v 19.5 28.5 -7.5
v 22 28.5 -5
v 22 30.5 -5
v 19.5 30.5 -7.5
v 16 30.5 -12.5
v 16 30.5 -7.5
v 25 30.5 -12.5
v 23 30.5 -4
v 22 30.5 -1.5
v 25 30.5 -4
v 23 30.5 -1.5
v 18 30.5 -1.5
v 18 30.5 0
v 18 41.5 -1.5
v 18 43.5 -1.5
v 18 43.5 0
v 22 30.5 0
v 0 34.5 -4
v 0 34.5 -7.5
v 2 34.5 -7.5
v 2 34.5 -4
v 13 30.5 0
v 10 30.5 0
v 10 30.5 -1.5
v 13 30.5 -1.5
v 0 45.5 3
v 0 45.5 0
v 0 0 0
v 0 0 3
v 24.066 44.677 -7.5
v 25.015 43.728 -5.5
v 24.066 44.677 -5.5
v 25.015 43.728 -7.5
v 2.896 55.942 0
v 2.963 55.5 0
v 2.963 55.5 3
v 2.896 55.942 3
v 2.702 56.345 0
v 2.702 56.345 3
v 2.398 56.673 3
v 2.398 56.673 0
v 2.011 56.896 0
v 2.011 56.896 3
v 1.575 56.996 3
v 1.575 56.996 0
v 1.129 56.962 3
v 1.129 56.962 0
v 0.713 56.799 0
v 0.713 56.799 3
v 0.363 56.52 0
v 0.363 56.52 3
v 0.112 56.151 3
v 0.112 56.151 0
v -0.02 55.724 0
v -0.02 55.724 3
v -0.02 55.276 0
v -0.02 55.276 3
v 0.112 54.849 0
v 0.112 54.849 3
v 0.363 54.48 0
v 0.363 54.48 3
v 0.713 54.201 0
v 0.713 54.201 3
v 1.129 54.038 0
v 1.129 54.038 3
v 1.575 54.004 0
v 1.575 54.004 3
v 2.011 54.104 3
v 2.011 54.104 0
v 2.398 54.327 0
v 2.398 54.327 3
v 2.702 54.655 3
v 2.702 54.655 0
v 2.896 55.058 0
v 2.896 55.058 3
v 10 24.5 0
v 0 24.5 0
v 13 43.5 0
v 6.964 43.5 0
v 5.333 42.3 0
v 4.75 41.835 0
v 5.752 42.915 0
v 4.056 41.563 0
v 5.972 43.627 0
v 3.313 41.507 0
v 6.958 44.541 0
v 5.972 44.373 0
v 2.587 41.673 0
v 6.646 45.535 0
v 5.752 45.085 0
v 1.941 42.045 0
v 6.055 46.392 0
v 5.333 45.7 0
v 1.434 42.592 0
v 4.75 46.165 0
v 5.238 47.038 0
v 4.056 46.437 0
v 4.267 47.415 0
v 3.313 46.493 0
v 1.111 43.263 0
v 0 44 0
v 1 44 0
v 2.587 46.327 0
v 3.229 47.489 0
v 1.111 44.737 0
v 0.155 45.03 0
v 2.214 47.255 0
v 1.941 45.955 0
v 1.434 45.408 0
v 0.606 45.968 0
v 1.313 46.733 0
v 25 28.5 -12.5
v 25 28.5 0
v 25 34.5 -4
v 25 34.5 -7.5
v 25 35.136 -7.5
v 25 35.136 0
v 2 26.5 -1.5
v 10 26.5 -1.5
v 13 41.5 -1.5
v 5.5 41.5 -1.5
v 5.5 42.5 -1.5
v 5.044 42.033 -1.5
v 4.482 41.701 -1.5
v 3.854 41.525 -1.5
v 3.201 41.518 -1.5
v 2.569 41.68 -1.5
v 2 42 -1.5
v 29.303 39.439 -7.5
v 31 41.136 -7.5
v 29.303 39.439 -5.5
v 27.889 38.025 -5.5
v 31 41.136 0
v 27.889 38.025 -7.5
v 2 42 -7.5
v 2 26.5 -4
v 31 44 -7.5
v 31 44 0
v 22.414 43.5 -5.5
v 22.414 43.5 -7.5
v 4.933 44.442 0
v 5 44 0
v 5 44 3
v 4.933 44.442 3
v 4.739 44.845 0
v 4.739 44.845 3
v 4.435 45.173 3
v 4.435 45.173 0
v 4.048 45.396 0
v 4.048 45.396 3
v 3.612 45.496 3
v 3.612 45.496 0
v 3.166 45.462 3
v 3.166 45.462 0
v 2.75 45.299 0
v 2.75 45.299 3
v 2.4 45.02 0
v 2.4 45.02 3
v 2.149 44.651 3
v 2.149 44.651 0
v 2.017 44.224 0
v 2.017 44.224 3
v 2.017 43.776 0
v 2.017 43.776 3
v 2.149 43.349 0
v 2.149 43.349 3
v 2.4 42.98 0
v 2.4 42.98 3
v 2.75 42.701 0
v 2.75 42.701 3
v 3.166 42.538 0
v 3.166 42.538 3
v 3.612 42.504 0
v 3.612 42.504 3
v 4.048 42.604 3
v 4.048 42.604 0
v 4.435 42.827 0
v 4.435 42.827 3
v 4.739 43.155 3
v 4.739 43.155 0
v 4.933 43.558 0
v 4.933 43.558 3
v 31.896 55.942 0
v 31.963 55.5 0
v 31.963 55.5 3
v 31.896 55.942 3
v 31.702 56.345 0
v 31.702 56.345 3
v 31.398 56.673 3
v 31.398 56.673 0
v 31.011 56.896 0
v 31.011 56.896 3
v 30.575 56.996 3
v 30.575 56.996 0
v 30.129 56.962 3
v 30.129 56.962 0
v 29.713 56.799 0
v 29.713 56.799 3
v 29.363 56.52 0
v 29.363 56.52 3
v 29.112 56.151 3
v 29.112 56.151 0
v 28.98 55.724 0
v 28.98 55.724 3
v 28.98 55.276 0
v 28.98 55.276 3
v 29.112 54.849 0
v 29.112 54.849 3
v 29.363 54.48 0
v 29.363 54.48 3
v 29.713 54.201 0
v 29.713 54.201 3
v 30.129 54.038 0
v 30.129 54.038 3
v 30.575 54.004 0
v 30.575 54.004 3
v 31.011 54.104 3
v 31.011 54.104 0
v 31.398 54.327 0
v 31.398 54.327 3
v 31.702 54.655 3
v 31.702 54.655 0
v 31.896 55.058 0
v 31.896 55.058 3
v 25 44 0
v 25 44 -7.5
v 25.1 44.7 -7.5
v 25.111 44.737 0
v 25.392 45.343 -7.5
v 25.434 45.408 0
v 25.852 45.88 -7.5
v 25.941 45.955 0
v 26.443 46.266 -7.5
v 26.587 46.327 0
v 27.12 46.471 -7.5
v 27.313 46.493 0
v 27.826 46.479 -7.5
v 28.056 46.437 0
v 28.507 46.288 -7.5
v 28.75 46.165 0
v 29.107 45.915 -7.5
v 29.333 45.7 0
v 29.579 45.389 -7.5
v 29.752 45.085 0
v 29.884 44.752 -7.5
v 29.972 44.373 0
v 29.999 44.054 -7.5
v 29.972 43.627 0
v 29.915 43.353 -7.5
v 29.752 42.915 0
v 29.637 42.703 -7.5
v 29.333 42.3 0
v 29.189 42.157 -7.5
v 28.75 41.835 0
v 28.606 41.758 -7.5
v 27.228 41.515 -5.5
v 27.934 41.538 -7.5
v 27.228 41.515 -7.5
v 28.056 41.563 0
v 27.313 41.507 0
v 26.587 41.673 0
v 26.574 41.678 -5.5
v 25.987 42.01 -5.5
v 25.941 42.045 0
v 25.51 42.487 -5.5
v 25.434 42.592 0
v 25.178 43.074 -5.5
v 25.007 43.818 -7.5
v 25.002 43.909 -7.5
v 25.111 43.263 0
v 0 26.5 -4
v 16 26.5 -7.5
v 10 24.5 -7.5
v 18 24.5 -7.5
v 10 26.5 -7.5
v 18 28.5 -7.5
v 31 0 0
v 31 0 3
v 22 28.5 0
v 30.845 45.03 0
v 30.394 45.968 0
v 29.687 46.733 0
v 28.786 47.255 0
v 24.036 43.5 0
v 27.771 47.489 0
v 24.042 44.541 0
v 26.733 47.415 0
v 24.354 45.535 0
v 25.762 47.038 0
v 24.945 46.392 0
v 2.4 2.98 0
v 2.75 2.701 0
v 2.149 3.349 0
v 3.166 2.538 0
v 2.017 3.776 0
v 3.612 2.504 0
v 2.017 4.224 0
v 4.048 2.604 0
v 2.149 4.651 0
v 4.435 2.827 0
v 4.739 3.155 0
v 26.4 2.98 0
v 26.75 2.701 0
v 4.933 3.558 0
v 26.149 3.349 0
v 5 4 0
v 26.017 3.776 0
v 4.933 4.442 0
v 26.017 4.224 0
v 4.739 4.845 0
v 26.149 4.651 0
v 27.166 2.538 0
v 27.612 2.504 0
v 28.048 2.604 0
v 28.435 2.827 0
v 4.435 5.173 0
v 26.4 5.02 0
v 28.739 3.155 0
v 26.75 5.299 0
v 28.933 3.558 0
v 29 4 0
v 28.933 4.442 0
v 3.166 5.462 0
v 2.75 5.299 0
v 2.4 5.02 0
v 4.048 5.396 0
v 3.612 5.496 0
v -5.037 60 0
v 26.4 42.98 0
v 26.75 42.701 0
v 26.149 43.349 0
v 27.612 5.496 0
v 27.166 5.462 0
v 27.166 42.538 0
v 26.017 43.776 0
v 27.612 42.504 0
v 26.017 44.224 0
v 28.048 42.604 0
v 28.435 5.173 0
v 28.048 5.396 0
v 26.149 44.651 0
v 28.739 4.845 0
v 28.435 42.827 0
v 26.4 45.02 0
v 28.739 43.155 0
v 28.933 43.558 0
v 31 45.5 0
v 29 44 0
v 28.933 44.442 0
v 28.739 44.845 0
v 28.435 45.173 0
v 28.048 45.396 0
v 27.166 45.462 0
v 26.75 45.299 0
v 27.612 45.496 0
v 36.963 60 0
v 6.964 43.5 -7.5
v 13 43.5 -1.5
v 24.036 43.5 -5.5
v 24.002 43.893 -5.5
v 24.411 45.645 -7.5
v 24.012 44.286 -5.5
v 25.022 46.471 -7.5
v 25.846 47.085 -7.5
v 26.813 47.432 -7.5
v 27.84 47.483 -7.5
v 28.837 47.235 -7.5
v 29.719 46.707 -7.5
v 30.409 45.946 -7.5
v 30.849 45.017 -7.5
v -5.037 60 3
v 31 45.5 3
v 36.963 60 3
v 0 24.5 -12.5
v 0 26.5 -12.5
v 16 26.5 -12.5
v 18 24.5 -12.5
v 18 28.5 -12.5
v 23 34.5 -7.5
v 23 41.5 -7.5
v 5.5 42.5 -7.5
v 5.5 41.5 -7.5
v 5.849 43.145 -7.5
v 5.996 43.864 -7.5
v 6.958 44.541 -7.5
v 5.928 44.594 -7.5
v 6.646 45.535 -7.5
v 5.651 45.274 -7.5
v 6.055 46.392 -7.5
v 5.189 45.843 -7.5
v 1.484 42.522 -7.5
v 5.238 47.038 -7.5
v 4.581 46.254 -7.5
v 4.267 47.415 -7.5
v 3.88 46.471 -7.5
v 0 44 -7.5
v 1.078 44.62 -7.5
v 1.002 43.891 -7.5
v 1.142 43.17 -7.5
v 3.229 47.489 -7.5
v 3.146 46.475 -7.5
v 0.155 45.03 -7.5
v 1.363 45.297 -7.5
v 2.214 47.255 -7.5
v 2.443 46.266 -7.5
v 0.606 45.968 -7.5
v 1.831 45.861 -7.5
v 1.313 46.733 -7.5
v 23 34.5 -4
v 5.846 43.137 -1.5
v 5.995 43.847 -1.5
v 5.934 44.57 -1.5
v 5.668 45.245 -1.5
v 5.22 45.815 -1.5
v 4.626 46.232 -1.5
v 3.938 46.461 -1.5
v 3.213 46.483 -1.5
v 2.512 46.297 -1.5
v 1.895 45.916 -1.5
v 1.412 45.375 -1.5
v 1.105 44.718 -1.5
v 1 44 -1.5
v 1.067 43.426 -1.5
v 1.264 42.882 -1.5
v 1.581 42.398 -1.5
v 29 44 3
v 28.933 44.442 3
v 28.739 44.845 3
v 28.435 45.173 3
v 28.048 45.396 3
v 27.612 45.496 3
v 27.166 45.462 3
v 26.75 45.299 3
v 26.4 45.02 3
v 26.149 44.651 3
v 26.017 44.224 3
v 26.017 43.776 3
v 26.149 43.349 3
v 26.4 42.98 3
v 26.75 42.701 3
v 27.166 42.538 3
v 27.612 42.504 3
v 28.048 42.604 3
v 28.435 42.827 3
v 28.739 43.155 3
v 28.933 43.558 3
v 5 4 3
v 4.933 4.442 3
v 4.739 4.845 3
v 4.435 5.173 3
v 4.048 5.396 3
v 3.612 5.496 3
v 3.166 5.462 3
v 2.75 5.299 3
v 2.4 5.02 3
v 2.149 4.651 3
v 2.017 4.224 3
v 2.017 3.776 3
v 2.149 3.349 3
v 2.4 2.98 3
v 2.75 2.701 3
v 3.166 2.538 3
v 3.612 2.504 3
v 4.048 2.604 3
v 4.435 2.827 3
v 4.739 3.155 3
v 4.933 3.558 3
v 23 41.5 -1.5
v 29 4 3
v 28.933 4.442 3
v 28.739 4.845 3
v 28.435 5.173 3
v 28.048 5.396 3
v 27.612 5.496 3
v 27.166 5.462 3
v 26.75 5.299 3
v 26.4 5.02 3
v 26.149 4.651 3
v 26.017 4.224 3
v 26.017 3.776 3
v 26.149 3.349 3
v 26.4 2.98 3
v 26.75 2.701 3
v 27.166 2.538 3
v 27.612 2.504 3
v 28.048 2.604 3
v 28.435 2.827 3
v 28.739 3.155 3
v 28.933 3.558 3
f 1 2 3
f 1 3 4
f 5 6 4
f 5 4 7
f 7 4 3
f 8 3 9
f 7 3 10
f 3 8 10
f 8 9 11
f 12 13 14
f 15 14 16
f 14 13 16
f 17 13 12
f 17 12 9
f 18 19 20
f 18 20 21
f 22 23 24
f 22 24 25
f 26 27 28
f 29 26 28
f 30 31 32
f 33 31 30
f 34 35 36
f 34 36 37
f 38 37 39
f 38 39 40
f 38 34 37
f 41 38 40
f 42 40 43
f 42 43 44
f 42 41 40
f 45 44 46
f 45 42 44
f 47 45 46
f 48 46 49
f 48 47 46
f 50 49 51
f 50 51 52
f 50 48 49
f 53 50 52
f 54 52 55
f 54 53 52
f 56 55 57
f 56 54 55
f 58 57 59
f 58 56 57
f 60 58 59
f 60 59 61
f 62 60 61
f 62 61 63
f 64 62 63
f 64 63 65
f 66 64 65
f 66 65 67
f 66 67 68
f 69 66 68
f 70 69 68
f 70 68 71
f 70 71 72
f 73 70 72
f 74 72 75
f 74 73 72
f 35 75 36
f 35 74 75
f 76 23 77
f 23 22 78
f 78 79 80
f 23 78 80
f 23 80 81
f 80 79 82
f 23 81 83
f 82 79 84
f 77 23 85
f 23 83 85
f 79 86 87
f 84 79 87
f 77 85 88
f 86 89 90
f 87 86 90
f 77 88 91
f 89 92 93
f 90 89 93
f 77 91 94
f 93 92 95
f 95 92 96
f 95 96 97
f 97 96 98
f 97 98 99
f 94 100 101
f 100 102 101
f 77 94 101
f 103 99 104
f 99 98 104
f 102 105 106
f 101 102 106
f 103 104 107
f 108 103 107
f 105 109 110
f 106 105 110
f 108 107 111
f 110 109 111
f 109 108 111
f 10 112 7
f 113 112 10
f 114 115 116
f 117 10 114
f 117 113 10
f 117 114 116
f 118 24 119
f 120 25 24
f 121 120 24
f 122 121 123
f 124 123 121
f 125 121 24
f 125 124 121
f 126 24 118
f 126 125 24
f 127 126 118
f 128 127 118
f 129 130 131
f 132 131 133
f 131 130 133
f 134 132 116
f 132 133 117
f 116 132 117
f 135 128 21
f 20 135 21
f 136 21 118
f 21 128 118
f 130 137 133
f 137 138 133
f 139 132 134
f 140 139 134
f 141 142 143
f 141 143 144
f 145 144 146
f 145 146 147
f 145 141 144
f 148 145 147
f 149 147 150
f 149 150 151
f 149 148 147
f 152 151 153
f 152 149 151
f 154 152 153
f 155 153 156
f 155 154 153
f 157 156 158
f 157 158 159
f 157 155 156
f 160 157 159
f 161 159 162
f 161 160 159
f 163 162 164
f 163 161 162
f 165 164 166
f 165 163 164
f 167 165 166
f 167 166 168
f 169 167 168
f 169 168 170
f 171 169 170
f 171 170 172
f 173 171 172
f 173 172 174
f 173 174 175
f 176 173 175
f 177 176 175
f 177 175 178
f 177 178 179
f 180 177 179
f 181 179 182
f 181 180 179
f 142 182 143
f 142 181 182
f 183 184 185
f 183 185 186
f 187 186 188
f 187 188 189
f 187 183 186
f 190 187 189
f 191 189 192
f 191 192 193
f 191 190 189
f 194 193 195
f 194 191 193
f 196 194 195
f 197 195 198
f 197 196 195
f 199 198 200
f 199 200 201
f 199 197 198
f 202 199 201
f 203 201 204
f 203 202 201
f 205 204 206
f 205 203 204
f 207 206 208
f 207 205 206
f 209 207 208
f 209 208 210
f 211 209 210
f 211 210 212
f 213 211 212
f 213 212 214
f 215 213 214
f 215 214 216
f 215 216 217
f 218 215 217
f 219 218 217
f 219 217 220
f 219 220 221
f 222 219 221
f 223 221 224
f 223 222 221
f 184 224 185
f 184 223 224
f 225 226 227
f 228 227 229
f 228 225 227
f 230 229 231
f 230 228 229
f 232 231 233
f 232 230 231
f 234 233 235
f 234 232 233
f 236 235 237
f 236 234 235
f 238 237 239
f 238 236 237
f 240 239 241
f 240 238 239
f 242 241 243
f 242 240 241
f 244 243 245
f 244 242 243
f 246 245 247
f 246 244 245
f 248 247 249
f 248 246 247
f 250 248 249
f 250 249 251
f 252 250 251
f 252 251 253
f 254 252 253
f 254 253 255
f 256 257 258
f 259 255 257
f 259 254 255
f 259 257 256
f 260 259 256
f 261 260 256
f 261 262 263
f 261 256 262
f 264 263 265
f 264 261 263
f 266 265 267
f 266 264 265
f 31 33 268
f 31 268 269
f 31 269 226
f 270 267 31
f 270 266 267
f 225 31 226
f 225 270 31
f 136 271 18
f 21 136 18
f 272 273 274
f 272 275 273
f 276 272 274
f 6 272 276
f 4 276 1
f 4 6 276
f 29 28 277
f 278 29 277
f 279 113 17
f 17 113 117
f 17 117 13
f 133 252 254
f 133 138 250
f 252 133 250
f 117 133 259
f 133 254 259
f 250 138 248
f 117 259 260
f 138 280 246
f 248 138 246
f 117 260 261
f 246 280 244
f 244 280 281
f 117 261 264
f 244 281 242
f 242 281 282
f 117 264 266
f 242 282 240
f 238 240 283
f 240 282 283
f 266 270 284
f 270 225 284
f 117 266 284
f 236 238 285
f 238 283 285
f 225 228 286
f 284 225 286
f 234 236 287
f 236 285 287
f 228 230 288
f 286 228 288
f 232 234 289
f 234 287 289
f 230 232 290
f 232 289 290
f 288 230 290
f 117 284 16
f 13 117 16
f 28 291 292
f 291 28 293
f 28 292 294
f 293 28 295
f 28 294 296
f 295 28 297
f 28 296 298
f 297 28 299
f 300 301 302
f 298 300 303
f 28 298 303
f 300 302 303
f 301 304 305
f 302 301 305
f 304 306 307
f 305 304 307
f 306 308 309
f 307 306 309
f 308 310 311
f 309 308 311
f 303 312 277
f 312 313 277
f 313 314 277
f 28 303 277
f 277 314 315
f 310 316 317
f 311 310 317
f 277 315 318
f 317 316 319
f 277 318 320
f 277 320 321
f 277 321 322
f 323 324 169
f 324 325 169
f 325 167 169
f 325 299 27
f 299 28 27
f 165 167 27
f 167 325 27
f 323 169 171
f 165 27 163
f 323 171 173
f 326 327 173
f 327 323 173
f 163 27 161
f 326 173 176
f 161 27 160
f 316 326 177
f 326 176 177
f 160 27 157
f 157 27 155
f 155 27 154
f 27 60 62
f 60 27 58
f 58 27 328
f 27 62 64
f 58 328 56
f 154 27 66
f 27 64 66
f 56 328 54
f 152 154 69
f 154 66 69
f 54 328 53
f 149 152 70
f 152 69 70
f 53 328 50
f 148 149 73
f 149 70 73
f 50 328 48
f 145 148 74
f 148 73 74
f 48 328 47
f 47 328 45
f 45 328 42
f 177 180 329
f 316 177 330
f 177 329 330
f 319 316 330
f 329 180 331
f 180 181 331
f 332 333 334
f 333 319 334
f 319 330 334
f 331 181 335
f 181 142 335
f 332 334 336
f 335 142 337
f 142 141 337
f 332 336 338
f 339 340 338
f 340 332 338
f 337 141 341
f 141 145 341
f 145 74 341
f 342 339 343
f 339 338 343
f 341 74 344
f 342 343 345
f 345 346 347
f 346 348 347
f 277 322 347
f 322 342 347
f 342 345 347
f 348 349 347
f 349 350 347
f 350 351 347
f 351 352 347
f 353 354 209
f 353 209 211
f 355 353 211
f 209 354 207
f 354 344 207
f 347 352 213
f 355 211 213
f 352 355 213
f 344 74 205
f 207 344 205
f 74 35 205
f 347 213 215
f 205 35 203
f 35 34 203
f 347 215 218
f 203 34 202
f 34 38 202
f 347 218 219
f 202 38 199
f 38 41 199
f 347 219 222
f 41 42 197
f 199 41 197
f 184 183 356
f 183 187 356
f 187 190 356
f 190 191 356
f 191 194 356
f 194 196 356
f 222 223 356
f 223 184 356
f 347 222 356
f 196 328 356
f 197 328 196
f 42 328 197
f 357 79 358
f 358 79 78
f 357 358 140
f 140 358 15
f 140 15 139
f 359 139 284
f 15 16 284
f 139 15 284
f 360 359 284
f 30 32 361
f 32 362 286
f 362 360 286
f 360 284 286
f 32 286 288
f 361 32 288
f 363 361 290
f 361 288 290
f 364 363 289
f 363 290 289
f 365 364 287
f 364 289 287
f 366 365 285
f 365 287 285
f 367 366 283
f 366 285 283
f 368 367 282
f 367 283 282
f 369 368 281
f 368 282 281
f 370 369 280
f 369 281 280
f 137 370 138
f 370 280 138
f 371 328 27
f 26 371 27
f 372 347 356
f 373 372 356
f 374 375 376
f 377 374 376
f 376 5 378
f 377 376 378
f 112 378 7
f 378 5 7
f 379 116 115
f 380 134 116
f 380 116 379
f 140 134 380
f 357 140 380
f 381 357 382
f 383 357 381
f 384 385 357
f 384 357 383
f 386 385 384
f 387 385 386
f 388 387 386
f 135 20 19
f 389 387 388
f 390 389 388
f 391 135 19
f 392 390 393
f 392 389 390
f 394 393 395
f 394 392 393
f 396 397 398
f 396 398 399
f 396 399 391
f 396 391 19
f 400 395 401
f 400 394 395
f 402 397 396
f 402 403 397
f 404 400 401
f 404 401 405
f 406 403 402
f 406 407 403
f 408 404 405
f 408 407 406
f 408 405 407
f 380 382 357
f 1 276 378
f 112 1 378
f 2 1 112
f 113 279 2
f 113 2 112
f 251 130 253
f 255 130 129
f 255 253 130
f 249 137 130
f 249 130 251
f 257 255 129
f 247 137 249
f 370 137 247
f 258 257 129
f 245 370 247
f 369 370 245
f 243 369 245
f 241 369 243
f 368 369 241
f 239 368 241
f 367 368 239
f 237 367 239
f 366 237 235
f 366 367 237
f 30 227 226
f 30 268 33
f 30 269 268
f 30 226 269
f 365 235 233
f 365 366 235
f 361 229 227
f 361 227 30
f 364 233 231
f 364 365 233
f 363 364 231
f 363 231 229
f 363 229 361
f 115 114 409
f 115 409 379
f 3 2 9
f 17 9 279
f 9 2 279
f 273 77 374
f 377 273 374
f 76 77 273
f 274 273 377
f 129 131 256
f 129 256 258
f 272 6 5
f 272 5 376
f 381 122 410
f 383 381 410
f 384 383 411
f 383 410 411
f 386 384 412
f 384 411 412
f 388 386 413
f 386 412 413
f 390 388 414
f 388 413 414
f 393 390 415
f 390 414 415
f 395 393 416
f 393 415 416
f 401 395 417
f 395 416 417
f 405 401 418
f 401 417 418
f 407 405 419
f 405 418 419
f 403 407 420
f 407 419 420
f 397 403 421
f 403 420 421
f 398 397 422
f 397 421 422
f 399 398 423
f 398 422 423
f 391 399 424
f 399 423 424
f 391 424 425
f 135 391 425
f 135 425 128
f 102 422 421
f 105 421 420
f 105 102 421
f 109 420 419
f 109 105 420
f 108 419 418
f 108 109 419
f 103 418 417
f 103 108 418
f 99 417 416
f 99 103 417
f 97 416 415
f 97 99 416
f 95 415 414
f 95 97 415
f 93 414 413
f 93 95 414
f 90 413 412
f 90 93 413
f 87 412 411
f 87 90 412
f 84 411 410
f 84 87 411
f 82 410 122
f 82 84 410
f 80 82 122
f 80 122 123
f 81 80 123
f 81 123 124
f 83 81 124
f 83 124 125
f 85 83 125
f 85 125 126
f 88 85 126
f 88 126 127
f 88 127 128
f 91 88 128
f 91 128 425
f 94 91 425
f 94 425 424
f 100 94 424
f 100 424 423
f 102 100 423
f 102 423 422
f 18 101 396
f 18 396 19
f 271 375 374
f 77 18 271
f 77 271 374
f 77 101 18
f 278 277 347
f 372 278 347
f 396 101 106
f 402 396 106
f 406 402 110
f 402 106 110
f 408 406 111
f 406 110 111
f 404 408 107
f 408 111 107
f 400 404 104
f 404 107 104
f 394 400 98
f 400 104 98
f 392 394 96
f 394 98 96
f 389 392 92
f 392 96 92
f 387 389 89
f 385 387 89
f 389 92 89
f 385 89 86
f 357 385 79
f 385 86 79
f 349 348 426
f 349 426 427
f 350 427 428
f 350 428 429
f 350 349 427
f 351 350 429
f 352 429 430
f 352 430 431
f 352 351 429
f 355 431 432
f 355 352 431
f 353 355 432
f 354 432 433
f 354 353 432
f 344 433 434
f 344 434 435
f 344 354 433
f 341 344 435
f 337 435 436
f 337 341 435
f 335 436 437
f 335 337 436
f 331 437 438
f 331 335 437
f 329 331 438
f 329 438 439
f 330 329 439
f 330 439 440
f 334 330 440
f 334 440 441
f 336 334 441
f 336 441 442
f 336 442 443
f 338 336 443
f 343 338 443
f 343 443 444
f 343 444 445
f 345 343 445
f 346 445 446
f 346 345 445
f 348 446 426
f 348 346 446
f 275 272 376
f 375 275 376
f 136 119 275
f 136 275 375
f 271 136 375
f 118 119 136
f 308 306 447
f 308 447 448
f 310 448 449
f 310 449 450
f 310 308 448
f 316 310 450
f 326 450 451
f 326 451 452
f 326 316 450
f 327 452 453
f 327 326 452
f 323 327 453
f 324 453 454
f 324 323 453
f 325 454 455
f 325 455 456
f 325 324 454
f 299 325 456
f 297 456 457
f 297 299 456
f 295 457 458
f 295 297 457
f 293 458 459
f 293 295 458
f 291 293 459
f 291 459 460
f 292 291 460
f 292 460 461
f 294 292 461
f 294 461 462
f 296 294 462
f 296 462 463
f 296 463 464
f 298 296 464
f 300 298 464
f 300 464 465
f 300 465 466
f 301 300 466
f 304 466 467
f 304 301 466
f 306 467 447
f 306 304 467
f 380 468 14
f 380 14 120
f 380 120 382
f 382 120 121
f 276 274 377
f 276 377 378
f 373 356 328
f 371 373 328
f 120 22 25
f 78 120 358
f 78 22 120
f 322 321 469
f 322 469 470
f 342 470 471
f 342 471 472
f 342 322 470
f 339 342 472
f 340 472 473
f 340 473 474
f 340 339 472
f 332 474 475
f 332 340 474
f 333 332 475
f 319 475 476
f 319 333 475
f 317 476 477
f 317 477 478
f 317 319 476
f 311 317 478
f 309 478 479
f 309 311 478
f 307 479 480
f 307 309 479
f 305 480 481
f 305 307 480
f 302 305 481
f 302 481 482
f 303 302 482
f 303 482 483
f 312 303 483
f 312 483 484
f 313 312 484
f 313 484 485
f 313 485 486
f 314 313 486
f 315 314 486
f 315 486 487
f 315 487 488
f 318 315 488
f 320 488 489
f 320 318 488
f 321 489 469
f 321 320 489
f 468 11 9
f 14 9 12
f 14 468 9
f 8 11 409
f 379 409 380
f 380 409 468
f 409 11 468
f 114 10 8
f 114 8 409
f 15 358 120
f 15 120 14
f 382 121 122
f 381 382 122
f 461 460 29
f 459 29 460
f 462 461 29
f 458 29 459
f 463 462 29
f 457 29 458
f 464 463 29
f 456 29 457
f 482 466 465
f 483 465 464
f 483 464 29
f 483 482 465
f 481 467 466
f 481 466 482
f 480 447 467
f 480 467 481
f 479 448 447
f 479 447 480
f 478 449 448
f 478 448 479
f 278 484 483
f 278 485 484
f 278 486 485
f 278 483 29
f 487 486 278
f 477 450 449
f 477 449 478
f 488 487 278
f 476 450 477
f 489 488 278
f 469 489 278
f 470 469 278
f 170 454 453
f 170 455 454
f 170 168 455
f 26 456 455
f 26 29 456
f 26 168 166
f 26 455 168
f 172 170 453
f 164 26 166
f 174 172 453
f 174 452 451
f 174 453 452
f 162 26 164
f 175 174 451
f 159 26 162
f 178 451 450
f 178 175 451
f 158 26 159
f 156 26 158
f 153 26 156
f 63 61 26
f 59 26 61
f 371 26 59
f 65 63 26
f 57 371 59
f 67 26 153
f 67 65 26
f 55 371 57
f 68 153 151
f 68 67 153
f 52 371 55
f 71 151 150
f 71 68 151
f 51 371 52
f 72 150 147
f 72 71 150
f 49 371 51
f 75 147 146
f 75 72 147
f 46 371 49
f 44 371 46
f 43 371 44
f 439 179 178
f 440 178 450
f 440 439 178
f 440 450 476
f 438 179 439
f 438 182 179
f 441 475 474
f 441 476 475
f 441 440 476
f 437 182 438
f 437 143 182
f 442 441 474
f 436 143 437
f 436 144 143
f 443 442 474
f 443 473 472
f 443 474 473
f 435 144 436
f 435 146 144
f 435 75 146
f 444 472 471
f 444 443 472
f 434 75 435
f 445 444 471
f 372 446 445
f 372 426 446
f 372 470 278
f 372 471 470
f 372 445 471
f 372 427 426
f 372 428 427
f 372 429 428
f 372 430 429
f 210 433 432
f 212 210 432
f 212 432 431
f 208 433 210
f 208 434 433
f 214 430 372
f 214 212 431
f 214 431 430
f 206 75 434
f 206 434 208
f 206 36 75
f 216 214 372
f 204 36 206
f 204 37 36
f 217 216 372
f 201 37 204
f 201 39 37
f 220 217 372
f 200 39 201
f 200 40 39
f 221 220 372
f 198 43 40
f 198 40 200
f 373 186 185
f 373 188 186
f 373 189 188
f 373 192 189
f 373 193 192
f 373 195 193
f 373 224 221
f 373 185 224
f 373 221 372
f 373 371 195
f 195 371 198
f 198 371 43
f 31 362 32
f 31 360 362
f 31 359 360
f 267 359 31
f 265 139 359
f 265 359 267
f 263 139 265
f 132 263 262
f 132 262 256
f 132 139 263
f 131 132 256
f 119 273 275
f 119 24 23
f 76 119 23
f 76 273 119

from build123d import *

# Parameters (mm, degrees)
SKETCH1_R           = 1.5
BOSS_EXTRUDE1_DEPTH = 3
SKETCH2_R           = 2.5
BOSS_EXTRUDE2_DEPTH = 1.5
SKETCH5_R           = 2.5
BOSS_EXTRUDE5_DEPTH = 6
SKETCH9_W           = 12
SKETCH9_H           = 8
CUT_EXTRUDE2_DEPTH  = 6
SKETCH11_W          = 8
SKETCH11_H          = 4
CUT_EXTRUDE4_DEPTH  = 2
SKETCH13_W          = 5
SKETCH13_H          = 13
CUT_EXTRUDE7_DEPTH  = 1.5
SKETCH16_W          = 2
SKETCH16_H          = 2
CUT_EXTRUDE9_DEPTH  = 39.820836522
BOSS_EXTRUDE6_DEPTH = 5
SKETCH20_W          = 3.5
SKETCH20_H          = 8
CUT_EXTRUDE10_DEPTH = 2
BOSS_EXTRUDE7_DEPTH = 2


with BuildPart() as part:
    # Sketch1 → Boss-Extrude1 (new body)
    with BuildSketch(Plane.XY):
        Polygon((0, 0), (31, 0), (31, 45.5), (36.963007518, 60), (-5.036992482, 60), (0, 45.5), align=None)
        with Locations((30.463007518, 55.5)):
            Circle(SKETCH1_R, mode=Mode.SUBTRACT)
        with Locations((27.5, 44)):
            Circle(SKETCH1_R, mode=Mode.SUBTRACT)
        with Locations((27.5, 4)):
            Circle(SKETCH1_R, mode=Mode.SUBTRACT)
        with Locations((3.5, 4)):
            Circle(SKETCH1_R, mode=Mode.SUBTRACT)
        with Locations((3.5, 44)):
            Circle(SKETCH1_R, mode=Mode.SUBTRACT)
        with Locations((1.463007518, 55.5)):
            Circle(SKETCH1_R, mode=Mode.SUBTRACT)
    extrude(amount=BOSS_EXTRUDE1_DEPTH)


with BuildPart() as body_2:
    # Sketch2 → Boss-Extrude2 (new body)
    with BuildSketch(Plane(origin=(0, 0, 0), x_dir=(-1, 0, 0), z_dir=(0, 0, -1))):
        with BuildLine():
            Line((0, 24.5), (0, 44))
            ThreePointArc((0, 44), (-3.750643519, 47.491013868), (-6.964101615, 43.5))
            Line((-6.964101615, 43.5), (-24.035898385, 43.5))
            ThreePointArc((-24.035898385, 43.5), (-27.249356481, 47.491013868), (-31, 44))
            Line((-31, 44), (-31, 41.136038969))
            Line((-31, 41.136038969), (-25, 35.136038969))
            Line((-25, 35.136038969), (-25, 28.5))
            Line((-25, 28.5), (-18, 28.5))
            Line((-18, 28.5), (-18, 24.5))
            Line((-18, 24.5), (0, 24.5))
        make_face()
        with Locations((-27.5, 44)):
            Circle(SKETCH2_R, mode=Mode.SUBTRACT)
        with Locations((-3.5, 44)):
            Circle(SKETCH2_R, mode=Mode.SUBTRACT)
    extrude(amount=BOSS_EXTRUDE2_DEPTH)

    # Sketch5 → Boss-Extrude5 (add)
    with BuildSketch(Plane(origin=(0, 0, -1.5), x_dir=(-1, 0, 0), z_dir=(0, 0, -1))):
        with BuildLine():
            Line((-6.964101615, 43.5), (-24.035898385, 43.5))
            ThreePointArc((-24.035898385, 43.5), (-27.249356481, 47.491013868), (-31, 44))
            Line((-31, 44), (-31, 41.136038969))
            Line((-31, 41.136038969), (-25, 35.136038969))
            Line((-25, 35.136038969), (-25, 28.5))
            Line((-25, 28.5), (-18, 28.5))
            Line((-18, 28.5), (-18, 24.5))
            Line((-18, 24.5), (0, 24.5))
            Line((0, 24.5), (0, 44))
            ThreePointArc((0, 44), (-3.750643519, 47.491013868), (-6.964101615, 43.5))
        make_face()
        with Locations((-27.5, 44)):
            Circle(SKETCH5_R, mode=Mode.SUBTRACT)
        with BuildLine():
            Line((-23, 41.5), (-5.5, 41.5))
            Line((-5.5, 41.5), (-5.5, 42.5))
            ThreePointArc((-5.5, 42.5), (-3.146446609, 46.474873734), (-2, 42))
            Line((-2, 42), (-2, 26.5))
            Line((-2, 26.5), (-16, 26.5))
            Line((-16, 26.5), (-16, 30.5))
            Line((-16, 30.5), (-23, 30.5))
            Line((-23, 30.5), (-23, 41.5))
        make_face(mode=Mode.SUBTRACT)
    extrude(amount=BOSS_EXTRUDE5_DEPTH)

    # Sketch9 → Cut-Extrude2 (cut)
    with BuildSketch(Plane.XZ.offset(-24.5)):
        with Locations((16, -4)):
            Rectangle(SKETCH9_W, SKETCH9_H)
    extrude(amount=-CUT_EXTRUDE2_DEPTH, mode=Mode.SUBTRACT)

    # Sketch11 → Cut-Extrude4 (cut)
    with BuildSketch(Plane(origin=(25, 0, 0), x_dir=(0, 0, -1), z_dir=(1, 0, 0))):
        with Locations((8, 32.5)):
            Rectangle(SKETCH11_W, SKETCH11_H)
    extrude(amount=-CUT_EXTRUDE4_DEPTH, mode=Mode.SUBTRACT)

    # Sketch13 → Cut-Extrude7 (cut)
    with BuildSketch(Plane.XY):
        with Locations((15.5, 37)):
            Rectangle(SKETCH13_W, SKETCH13_H)
    extrude(amount=-CUT_EXTRUDE7_DEPTH, mode=Mode.SUBTRACT)

    # Sketch16 → Cut-Extrude9 (cut, through all)
    with BuildSketch(Plane(origin=(-5.068019485, 5.068019485, 0), x_dir=(0, 0, -1), z_dir=(0.707106781, -0.707106781, 0))):
        with Locations((6.5, 47.608387387)):
            Rectangle(SKETCH16_W, SKETCH16_H)
    extrude(amount=-CUT_EXTRUDE9_DEPTH, mode=Mode.SUBTRACT)

    # Sketch19 → Boss-Extrude6 (add)
    with BuildSketch(Plane(origin=(0, 0, -7.5), x_dir=(-1, 0, 0), z_dir=(0, 0, -1))):
        Polygon((-18, 28.5), (-25, 28.5), (-25, 30.5), (-16, 30.5), (-16, 26.5), (0, 26.5), (0, 24.5), (-18, 24.5), align=None)
    extrude(amount=BOSS_EXTRUDE6_DEPTH)

    # Sketch20 → Cut-Extrude10 (cut)
    with BuildSketch(Plane.ZY):
        with Locations((-5.75, 30.5)):
            Rectangle(SKETCH20_W, SKETCH20_H)
    extrude(amount=-CUT_EXTRUDE10_DEPTH, mode=Mode.SUBTRACT)

    # Sketch21 → Boss-Extrude7 (add)
    with BuildSketch(Plane.XZ.offset(-28.5)):
        Polygon((22, -5), (19.5, -7.5), (22, -7.5), align=None)
    extrude(amount=-BOSS_EXTRUDE7_DEPTH)


solid = Compound([part.part, body_2.part])
